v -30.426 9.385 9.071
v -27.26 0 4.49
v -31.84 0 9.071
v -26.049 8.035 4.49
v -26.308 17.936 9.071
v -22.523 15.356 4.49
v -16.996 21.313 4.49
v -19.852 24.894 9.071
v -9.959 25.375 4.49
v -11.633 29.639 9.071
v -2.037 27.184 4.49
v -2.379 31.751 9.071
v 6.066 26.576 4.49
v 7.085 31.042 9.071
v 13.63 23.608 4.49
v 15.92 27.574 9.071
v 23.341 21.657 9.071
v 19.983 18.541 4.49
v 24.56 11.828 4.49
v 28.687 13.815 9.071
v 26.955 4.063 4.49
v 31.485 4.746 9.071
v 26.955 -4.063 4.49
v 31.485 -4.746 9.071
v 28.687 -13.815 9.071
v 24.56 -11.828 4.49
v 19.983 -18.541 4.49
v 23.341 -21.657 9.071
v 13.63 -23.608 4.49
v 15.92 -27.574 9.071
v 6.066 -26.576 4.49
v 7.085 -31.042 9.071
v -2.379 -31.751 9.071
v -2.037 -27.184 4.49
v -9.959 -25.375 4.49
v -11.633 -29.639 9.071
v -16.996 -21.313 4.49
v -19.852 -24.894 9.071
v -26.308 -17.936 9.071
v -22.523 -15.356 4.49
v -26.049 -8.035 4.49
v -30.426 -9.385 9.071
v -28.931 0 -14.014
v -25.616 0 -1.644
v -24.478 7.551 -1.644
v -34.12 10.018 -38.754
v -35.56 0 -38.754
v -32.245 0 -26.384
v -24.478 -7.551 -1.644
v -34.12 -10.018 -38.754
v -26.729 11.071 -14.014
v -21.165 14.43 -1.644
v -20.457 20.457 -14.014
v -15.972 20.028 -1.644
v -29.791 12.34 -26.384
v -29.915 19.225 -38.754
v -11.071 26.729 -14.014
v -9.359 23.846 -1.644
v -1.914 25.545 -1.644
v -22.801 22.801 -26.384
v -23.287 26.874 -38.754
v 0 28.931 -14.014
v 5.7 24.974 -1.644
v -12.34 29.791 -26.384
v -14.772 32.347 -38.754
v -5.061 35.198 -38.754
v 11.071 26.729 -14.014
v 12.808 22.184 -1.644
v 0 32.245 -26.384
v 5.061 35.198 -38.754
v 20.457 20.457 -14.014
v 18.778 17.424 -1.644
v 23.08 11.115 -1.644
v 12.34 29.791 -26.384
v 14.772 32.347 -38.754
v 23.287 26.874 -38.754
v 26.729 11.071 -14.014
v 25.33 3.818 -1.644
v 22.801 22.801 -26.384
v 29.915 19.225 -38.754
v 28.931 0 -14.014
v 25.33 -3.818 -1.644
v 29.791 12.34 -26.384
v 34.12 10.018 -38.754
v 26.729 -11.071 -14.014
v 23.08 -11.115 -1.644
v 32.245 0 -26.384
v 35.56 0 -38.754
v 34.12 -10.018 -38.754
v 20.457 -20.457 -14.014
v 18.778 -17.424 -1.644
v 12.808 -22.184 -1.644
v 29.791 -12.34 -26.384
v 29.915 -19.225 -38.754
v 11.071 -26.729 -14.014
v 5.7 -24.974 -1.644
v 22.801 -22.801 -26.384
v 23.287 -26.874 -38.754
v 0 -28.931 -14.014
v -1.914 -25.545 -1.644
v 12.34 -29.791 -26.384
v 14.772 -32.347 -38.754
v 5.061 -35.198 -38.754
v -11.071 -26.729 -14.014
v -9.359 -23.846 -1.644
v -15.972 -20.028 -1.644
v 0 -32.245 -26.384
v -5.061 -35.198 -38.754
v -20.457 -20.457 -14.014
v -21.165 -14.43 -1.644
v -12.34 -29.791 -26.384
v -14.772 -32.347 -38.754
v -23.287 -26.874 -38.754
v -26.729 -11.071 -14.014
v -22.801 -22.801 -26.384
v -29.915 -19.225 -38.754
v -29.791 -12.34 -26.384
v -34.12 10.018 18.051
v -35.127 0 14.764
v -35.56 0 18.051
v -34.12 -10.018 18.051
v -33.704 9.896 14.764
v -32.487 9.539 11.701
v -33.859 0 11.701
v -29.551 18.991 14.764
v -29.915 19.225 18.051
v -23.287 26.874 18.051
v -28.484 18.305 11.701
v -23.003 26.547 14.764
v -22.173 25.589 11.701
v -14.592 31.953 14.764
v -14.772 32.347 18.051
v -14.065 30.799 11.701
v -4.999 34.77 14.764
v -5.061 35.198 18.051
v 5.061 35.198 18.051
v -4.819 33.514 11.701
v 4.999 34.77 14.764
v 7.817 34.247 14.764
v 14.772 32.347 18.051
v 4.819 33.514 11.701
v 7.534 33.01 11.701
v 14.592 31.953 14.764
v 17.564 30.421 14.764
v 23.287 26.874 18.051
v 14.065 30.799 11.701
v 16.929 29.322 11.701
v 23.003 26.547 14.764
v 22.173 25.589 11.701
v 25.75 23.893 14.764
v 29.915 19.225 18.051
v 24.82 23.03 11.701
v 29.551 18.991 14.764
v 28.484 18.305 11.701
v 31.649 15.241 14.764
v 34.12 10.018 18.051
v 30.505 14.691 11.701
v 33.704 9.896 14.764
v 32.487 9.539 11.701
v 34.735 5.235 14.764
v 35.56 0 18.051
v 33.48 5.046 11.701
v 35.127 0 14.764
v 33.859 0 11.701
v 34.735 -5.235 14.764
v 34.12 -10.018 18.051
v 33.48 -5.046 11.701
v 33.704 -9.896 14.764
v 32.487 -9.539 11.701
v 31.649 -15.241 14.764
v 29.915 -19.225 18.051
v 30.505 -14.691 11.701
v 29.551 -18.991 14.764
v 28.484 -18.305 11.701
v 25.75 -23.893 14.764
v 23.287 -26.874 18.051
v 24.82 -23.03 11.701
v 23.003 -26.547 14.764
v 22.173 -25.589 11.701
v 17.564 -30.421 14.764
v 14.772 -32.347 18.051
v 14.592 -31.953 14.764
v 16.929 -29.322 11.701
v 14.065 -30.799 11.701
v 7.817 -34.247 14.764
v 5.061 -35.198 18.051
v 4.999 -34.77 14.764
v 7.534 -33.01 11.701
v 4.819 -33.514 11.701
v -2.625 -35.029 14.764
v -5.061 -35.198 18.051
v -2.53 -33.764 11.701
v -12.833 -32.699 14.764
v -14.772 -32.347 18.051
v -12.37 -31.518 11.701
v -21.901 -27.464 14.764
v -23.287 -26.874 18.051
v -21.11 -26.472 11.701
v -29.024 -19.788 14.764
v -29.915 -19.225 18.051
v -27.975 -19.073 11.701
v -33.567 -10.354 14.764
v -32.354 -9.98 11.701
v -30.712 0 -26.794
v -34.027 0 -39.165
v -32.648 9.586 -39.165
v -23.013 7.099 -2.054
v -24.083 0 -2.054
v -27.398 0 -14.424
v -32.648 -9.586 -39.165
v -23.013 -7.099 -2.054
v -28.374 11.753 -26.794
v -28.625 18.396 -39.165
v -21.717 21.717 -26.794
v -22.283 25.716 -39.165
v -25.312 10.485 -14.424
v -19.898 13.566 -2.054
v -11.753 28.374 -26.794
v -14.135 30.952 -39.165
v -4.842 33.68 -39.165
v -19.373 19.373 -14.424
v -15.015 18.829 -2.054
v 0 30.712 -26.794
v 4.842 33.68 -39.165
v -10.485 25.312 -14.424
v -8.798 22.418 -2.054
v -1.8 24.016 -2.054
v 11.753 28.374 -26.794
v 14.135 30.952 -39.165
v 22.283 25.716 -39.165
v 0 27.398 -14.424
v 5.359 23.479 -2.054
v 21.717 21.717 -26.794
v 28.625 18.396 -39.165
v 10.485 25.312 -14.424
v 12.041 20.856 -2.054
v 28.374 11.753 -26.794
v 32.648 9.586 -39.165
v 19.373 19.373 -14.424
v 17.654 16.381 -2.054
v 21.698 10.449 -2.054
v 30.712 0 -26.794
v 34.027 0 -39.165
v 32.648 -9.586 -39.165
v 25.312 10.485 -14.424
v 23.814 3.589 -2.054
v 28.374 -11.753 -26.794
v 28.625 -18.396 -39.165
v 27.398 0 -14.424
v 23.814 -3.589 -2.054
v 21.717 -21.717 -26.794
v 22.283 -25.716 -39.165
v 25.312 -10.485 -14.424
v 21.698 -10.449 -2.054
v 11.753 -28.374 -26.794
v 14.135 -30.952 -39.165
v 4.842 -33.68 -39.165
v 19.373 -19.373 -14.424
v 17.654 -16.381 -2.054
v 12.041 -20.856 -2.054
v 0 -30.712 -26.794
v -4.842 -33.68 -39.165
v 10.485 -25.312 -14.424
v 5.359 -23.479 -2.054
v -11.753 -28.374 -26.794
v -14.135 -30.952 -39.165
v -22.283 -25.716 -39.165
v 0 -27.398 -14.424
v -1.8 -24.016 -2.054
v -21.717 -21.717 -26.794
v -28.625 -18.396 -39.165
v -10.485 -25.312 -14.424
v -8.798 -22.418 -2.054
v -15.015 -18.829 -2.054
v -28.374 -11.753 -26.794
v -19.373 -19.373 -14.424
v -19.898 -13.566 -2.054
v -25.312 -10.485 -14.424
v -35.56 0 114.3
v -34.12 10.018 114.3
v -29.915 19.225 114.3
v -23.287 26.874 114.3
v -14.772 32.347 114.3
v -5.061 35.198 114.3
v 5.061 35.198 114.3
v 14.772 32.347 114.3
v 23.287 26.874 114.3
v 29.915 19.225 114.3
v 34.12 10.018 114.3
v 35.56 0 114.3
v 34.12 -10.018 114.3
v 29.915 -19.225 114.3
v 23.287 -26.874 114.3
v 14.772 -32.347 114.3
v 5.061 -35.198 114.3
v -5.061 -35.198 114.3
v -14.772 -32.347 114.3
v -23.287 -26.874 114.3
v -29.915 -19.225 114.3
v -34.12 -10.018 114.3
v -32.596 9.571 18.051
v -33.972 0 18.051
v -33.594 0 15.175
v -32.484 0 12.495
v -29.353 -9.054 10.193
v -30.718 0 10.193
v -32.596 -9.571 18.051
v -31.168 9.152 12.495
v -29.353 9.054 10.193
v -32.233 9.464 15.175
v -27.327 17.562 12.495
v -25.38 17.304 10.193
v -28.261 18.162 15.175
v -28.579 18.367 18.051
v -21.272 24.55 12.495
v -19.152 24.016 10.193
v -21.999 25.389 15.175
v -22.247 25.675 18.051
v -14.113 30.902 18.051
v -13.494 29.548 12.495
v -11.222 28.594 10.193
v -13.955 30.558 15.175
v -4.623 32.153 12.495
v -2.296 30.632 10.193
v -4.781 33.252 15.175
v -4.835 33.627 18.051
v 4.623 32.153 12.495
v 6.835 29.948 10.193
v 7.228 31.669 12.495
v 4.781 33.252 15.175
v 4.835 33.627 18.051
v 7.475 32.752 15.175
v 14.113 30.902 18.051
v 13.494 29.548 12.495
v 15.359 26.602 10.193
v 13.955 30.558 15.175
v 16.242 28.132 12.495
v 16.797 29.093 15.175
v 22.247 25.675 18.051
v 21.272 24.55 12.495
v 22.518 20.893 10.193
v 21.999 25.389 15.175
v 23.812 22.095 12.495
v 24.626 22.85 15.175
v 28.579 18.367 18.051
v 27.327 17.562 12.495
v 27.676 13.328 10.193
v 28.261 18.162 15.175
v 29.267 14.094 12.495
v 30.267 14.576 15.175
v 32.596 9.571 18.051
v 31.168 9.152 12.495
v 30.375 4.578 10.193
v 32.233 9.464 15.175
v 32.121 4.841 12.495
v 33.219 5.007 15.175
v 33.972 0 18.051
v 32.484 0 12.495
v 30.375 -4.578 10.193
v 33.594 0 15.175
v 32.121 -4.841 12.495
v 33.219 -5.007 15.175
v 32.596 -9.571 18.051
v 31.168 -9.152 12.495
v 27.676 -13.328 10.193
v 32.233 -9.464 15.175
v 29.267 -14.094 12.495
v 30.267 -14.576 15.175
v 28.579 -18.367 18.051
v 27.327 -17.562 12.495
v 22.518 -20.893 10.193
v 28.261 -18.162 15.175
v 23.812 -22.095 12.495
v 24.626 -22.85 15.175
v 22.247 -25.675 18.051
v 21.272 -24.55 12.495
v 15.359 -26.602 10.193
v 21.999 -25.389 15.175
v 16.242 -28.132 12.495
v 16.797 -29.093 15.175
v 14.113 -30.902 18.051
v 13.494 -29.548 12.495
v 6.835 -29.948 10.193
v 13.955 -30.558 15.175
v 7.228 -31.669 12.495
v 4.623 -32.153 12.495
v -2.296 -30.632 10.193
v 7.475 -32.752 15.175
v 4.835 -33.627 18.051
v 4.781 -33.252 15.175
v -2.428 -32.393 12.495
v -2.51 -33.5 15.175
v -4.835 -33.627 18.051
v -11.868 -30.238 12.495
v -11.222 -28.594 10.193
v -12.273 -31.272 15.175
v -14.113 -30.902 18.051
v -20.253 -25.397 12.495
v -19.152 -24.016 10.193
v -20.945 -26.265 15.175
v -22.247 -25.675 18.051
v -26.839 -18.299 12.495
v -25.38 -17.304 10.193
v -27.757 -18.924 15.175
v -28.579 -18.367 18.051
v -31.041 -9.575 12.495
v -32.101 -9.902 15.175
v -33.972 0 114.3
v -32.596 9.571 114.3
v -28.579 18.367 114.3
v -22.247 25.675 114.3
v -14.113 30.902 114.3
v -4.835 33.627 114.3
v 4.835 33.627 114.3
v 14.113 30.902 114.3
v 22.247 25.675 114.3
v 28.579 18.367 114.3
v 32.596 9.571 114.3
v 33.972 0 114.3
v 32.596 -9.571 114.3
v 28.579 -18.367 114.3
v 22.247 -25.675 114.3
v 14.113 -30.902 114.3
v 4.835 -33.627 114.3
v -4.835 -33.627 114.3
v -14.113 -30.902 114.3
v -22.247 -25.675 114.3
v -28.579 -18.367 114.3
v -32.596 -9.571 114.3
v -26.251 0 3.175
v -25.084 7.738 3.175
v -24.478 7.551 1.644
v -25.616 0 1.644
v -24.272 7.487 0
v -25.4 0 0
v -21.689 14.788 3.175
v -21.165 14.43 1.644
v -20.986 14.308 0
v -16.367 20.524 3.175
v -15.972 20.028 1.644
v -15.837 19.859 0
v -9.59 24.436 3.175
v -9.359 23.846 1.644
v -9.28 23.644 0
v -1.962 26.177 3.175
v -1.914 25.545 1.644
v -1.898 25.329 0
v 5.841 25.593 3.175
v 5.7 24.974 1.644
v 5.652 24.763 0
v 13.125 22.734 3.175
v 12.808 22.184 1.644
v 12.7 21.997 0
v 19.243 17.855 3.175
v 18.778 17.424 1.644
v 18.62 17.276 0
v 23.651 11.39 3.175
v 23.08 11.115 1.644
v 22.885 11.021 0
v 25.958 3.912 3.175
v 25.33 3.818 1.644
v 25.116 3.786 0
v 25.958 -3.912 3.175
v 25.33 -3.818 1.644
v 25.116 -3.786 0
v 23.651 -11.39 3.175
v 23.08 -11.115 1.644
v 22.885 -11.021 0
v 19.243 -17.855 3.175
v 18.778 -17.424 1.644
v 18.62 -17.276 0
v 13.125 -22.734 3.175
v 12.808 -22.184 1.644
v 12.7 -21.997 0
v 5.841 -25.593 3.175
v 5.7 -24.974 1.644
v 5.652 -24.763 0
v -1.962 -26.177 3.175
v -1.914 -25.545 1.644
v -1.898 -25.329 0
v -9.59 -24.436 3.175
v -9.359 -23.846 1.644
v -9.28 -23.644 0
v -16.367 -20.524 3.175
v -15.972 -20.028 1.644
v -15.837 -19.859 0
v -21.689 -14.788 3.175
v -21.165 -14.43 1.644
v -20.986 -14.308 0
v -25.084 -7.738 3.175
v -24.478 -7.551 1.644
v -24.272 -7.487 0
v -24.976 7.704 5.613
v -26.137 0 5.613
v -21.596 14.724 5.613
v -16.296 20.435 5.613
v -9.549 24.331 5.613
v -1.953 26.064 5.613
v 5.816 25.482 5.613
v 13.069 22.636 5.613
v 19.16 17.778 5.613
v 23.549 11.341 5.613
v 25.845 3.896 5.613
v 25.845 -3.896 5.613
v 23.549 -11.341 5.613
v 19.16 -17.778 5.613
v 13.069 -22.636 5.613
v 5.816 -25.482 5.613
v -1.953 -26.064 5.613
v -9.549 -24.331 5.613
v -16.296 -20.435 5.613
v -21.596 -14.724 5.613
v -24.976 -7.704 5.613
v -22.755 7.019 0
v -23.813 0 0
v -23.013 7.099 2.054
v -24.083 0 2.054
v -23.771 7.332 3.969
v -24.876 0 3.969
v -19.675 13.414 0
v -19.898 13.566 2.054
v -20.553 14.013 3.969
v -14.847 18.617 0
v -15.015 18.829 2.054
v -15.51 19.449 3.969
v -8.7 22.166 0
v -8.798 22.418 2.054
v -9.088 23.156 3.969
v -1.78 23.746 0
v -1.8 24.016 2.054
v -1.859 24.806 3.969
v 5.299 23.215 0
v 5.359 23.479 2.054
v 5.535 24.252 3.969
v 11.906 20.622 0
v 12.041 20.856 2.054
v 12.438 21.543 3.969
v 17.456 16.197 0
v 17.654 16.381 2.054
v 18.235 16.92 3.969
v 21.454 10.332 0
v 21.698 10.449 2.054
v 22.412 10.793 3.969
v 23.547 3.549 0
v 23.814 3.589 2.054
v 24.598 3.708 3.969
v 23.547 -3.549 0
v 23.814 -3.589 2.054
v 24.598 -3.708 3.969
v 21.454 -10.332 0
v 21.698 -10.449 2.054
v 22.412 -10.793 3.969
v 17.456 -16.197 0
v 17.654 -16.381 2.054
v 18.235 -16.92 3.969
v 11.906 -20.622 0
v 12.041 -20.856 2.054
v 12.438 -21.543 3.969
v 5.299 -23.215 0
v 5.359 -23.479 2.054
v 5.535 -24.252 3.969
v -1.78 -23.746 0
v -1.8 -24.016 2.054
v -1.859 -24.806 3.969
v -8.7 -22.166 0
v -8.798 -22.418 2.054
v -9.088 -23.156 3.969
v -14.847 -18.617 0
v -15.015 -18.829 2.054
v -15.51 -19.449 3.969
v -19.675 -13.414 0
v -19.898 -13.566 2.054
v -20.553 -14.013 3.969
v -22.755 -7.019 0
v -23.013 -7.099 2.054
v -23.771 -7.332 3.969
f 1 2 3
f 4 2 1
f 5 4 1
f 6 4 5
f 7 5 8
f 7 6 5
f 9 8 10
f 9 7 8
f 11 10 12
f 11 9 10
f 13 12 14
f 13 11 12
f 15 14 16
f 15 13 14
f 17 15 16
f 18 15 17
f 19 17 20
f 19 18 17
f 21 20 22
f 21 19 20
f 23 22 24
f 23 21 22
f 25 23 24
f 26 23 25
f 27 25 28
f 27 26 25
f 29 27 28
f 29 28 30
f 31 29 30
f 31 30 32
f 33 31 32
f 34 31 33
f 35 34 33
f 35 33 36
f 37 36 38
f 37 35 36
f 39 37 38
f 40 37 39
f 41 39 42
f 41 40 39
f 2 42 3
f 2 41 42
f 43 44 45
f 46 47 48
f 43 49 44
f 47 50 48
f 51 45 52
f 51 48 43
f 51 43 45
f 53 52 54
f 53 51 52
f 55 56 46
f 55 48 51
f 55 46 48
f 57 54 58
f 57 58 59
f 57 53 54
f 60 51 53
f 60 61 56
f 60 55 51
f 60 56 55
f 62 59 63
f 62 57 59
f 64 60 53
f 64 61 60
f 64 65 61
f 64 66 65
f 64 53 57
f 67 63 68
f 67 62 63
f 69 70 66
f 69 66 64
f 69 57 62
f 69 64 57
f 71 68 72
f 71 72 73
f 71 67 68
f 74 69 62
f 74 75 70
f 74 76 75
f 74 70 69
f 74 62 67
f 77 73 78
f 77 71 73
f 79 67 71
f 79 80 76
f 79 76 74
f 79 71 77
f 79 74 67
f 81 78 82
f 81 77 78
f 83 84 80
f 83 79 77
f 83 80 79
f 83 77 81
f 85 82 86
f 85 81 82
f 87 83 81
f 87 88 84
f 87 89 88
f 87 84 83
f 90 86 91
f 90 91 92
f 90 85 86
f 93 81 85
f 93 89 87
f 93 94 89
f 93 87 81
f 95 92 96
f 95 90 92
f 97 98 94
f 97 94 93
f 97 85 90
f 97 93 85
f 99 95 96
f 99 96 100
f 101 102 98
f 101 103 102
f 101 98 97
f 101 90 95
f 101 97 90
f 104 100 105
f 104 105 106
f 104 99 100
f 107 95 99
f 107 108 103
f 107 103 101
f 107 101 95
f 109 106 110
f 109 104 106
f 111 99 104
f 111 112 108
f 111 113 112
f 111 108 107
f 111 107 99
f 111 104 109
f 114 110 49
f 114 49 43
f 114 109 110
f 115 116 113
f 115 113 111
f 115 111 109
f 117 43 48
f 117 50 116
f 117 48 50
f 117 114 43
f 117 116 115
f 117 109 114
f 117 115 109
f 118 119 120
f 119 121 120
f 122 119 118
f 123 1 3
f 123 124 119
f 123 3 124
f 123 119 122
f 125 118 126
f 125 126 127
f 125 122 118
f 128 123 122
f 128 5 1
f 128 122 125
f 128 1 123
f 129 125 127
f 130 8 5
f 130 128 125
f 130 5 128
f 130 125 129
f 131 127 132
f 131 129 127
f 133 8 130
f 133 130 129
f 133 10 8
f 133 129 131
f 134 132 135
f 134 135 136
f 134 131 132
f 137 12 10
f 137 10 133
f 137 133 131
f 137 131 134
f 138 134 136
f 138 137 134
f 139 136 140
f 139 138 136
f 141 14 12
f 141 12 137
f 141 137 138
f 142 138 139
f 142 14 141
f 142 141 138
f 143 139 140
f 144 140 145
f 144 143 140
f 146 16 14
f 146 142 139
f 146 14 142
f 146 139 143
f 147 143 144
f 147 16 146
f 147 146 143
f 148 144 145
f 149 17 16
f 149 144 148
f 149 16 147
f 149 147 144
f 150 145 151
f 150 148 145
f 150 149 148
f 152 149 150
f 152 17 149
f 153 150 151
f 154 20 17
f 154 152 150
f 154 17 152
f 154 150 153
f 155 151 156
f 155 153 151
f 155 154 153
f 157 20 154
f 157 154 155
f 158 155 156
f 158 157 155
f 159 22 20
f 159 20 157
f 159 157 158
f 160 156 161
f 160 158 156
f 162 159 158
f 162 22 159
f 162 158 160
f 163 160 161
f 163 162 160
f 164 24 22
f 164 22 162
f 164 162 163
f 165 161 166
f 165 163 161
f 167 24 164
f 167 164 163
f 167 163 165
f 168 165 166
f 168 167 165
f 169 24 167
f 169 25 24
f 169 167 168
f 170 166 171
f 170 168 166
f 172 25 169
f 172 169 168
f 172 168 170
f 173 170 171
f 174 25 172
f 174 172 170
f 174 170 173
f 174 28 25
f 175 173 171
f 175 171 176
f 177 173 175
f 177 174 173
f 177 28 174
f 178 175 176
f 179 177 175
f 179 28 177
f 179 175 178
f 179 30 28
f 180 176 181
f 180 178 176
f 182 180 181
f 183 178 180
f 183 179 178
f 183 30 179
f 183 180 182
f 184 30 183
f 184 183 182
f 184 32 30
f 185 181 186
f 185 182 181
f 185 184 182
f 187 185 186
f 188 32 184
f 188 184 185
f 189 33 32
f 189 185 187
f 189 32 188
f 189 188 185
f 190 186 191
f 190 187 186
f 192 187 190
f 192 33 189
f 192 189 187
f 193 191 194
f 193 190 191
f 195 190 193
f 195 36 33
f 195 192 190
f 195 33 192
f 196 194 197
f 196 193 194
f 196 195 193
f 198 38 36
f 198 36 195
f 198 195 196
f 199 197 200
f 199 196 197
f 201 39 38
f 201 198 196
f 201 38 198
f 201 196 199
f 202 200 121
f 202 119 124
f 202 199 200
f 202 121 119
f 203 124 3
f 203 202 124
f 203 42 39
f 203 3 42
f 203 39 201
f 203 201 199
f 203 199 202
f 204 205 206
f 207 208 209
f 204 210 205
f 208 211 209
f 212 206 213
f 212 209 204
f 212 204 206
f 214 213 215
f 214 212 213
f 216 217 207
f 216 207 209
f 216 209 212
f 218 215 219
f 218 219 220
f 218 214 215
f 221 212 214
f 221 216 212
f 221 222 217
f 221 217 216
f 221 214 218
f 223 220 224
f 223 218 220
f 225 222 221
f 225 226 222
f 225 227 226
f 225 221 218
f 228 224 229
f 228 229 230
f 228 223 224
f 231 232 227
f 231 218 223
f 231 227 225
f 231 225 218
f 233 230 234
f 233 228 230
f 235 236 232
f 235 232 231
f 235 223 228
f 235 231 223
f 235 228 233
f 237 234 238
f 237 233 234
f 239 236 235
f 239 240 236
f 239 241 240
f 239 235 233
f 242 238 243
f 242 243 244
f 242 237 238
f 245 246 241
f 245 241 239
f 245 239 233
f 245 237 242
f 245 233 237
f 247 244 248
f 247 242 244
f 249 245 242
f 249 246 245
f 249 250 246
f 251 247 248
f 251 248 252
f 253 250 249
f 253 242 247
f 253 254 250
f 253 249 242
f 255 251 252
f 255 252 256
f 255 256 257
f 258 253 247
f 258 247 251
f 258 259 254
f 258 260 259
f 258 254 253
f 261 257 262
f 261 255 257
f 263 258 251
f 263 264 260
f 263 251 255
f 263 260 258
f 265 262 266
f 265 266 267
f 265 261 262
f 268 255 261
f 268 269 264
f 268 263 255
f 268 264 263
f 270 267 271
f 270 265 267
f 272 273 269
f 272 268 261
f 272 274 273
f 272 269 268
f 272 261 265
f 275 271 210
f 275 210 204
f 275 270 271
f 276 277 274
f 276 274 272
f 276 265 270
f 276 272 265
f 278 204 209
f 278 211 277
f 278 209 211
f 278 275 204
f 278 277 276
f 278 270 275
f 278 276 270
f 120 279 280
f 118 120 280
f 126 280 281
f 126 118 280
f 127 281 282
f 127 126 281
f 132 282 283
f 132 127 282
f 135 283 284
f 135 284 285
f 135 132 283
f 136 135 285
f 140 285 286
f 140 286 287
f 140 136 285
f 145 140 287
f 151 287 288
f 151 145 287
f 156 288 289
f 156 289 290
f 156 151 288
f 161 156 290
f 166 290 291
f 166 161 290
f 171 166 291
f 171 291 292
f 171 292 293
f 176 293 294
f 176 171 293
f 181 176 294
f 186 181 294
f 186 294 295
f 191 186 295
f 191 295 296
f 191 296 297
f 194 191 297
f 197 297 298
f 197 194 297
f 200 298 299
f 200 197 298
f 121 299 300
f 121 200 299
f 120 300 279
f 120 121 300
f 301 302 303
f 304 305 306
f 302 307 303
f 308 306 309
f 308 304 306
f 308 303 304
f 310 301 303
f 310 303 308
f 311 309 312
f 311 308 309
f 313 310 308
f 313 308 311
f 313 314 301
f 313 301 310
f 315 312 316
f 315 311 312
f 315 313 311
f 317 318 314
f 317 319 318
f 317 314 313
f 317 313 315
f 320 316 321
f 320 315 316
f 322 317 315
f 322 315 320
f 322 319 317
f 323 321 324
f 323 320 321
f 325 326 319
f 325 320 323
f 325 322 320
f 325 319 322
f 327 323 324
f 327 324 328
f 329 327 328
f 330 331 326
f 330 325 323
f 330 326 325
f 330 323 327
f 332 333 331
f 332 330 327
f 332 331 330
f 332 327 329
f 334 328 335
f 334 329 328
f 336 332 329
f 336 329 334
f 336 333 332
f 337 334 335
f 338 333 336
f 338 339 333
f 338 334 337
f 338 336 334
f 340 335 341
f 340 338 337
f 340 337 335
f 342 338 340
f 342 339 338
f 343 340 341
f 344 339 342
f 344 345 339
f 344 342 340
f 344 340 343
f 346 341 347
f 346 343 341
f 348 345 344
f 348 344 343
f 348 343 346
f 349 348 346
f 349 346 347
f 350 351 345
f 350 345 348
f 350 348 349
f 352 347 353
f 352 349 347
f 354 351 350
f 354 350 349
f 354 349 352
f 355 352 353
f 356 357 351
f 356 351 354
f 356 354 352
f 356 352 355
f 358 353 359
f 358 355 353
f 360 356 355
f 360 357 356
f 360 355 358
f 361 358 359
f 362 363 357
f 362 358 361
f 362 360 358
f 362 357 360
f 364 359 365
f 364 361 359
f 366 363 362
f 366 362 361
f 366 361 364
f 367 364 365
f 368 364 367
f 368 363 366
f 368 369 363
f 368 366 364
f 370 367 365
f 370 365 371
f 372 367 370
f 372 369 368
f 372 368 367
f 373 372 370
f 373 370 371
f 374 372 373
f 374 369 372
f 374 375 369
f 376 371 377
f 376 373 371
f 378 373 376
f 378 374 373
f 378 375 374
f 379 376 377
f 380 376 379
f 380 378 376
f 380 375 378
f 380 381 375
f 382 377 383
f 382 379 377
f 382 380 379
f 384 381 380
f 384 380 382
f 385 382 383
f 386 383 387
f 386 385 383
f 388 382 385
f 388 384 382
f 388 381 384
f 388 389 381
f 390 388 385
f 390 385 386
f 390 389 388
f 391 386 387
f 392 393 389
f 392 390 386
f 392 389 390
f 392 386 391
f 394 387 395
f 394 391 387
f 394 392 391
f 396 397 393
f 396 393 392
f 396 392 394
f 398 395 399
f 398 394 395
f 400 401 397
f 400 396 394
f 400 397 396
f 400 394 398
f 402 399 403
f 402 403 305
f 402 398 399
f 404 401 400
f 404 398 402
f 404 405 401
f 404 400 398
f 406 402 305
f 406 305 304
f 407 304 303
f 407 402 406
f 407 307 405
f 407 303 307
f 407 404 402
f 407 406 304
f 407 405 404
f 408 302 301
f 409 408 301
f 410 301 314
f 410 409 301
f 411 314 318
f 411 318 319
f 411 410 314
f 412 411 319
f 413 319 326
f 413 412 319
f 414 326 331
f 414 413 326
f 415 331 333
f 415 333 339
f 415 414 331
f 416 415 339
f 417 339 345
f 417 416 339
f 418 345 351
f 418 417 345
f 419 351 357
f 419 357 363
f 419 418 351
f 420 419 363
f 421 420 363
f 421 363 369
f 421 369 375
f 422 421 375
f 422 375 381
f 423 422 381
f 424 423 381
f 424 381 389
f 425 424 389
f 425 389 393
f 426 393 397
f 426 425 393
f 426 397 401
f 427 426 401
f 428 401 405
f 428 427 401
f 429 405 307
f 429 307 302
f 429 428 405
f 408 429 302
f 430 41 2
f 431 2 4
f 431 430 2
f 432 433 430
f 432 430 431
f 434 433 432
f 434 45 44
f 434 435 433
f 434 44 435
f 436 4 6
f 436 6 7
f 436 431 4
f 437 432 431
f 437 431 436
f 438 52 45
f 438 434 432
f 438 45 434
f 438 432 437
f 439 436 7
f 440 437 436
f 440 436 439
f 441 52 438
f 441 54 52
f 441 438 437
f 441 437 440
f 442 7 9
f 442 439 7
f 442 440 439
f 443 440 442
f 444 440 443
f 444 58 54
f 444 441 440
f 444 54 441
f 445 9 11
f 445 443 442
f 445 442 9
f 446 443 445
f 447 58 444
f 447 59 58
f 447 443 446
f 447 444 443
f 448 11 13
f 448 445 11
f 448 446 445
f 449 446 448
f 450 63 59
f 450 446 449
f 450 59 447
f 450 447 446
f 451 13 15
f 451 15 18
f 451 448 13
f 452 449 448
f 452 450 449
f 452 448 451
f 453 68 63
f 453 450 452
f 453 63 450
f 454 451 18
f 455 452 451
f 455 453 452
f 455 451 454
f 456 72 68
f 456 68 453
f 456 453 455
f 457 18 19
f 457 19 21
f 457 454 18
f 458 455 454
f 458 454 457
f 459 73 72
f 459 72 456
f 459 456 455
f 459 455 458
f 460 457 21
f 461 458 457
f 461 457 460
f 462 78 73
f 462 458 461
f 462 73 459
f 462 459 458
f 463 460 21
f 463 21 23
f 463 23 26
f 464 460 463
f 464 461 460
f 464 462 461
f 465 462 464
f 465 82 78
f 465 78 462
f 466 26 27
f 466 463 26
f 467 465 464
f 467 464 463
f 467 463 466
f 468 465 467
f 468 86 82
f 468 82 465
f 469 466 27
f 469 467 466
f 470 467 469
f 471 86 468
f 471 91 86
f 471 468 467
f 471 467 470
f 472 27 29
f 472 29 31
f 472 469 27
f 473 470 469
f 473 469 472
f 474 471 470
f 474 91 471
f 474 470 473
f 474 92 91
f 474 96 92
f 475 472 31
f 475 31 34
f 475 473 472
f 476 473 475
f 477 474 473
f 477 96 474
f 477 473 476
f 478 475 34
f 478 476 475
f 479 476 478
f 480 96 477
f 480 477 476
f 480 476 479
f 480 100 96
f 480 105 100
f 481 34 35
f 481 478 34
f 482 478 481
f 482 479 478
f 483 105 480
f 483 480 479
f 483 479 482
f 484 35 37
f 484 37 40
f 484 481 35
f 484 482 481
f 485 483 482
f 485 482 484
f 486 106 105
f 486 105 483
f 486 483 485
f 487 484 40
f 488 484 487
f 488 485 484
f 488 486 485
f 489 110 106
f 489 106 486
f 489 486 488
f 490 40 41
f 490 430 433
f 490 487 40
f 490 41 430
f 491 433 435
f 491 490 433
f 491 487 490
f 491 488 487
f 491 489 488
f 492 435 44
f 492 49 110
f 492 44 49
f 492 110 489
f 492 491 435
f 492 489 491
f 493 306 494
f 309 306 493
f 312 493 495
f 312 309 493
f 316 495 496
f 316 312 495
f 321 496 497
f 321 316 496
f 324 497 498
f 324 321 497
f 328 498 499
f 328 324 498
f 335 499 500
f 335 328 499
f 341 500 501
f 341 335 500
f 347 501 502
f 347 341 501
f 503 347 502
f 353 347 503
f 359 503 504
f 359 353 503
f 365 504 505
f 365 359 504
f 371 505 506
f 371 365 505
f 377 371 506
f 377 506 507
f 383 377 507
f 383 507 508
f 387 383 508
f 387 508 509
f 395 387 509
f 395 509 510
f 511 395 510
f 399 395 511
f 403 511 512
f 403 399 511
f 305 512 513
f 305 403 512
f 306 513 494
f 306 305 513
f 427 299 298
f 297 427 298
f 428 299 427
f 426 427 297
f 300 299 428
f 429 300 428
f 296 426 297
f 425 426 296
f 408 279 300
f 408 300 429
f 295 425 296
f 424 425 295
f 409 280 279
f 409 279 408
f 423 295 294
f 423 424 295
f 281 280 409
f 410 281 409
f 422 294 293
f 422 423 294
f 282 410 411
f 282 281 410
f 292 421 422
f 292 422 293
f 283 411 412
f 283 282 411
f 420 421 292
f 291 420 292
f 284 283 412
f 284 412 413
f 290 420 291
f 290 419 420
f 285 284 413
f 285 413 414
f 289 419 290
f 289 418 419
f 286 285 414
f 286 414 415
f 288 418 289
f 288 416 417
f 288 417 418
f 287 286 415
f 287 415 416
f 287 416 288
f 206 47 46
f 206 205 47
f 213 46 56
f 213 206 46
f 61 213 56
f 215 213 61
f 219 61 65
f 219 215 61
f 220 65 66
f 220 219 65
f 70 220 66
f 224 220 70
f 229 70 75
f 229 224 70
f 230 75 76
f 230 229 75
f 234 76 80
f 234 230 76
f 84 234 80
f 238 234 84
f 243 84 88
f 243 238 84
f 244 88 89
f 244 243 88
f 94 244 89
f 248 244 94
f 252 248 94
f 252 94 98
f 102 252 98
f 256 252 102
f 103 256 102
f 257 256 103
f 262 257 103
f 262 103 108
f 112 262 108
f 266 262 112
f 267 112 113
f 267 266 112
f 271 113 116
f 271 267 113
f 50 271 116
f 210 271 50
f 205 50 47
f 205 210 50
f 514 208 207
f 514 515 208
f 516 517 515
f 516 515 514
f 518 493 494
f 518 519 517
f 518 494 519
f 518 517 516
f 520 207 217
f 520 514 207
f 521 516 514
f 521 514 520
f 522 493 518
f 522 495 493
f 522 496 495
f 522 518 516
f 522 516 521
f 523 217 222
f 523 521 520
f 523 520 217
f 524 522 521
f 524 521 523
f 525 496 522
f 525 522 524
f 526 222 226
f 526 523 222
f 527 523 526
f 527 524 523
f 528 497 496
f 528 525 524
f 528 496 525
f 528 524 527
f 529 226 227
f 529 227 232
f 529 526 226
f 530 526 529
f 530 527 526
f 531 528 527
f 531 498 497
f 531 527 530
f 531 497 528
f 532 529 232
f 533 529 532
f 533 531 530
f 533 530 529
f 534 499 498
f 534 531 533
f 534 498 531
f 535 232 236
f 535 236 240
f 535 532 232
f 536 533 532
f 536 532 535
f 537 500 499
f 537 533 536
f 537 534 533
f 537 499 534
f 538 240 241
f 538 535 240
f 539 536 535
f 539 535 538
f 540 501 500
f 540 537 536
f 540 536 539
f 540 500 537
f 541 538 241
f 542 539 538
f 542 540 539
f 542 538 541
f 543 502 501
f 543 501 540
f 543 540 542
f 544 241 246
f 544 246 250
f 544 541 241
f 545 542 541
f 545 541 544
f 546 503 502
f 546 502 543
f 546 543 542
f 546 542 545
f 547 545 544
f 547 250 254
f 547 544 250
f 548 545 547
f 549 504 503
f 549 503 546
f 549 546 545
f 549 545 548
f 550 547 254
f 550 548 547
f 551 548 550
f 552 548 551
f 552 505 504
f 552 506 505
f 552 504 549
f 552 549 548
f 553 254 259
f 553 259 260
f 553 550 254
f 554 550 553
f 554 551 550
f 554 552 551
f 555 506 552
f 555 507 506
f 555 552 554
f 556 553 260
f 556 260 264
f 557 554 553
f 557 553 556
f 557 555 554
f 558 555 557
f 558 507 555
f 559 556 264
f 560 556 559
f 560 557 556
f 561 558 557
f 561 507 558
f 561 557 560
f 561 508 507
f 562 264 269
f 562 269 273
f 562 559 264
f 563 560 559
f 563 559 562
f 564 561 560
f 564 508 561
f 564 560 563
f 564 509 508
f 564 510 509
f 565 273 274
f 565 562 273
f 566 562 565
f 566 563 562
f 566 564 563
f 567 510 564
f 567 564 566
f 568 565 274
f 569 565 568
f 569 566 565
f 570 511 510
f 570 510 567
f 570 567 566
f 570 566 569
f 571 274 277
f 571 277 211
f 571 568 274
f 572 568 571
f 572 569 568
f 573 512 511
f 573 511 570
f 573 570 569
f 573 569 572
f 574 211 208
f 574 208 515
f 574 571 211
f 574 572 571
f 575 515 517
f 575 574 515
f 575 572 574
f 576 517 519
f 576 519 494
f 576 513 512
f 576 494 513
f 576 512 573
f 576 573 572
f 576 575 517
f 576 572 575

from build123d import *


with BuildPart() as f1:
    # F0 (on Front) → F1 (revolve)
    with BuildSketch(Plane.XZ):
        with BuildLine():
            Line((-33.9725, 114.3), (-35.56, 114.3))
            Line((-35.56, 114.3), (-35.56, 18.050768))
            ThreePointArc((-35.56, 18.050768), (-34.59327, 13.190689), (-31.840256, 9.070512))
            Line((-31.840256, 9.070512), (-27.259872, 4.490128))
            ThreePointArc((-27.259872, 4.490128), (-25.616371, 1.643501), (-25.616371, -1.643501))
            Line((-25.616371, -1.643501), (-35.56, -38.75363))
            Line((-35.56, -38.75363), (-34.026593, -39.164505))
            Line((-34.026593, -39.164505), (-24.082964, -2.054376))
            ThreePointArc((-24.082964, -2.054376), (-24.082964, 2.054376), (-26.13734, 5.61266))
            Line((-26.13734, 5.61266), (-30.717724, 10.193044))
            ThreePointArc((-30.717724, 10.193044), (-33.126611, 13.798199), (-33.9725, 18.050768))
            Line((-33.9725, 18.050768), (-33.9725, 114.3))
        make_face()
    revolve(axis=Axis((0, 0, 37.567748), (0, 0, -1)))


solid = f1.part
